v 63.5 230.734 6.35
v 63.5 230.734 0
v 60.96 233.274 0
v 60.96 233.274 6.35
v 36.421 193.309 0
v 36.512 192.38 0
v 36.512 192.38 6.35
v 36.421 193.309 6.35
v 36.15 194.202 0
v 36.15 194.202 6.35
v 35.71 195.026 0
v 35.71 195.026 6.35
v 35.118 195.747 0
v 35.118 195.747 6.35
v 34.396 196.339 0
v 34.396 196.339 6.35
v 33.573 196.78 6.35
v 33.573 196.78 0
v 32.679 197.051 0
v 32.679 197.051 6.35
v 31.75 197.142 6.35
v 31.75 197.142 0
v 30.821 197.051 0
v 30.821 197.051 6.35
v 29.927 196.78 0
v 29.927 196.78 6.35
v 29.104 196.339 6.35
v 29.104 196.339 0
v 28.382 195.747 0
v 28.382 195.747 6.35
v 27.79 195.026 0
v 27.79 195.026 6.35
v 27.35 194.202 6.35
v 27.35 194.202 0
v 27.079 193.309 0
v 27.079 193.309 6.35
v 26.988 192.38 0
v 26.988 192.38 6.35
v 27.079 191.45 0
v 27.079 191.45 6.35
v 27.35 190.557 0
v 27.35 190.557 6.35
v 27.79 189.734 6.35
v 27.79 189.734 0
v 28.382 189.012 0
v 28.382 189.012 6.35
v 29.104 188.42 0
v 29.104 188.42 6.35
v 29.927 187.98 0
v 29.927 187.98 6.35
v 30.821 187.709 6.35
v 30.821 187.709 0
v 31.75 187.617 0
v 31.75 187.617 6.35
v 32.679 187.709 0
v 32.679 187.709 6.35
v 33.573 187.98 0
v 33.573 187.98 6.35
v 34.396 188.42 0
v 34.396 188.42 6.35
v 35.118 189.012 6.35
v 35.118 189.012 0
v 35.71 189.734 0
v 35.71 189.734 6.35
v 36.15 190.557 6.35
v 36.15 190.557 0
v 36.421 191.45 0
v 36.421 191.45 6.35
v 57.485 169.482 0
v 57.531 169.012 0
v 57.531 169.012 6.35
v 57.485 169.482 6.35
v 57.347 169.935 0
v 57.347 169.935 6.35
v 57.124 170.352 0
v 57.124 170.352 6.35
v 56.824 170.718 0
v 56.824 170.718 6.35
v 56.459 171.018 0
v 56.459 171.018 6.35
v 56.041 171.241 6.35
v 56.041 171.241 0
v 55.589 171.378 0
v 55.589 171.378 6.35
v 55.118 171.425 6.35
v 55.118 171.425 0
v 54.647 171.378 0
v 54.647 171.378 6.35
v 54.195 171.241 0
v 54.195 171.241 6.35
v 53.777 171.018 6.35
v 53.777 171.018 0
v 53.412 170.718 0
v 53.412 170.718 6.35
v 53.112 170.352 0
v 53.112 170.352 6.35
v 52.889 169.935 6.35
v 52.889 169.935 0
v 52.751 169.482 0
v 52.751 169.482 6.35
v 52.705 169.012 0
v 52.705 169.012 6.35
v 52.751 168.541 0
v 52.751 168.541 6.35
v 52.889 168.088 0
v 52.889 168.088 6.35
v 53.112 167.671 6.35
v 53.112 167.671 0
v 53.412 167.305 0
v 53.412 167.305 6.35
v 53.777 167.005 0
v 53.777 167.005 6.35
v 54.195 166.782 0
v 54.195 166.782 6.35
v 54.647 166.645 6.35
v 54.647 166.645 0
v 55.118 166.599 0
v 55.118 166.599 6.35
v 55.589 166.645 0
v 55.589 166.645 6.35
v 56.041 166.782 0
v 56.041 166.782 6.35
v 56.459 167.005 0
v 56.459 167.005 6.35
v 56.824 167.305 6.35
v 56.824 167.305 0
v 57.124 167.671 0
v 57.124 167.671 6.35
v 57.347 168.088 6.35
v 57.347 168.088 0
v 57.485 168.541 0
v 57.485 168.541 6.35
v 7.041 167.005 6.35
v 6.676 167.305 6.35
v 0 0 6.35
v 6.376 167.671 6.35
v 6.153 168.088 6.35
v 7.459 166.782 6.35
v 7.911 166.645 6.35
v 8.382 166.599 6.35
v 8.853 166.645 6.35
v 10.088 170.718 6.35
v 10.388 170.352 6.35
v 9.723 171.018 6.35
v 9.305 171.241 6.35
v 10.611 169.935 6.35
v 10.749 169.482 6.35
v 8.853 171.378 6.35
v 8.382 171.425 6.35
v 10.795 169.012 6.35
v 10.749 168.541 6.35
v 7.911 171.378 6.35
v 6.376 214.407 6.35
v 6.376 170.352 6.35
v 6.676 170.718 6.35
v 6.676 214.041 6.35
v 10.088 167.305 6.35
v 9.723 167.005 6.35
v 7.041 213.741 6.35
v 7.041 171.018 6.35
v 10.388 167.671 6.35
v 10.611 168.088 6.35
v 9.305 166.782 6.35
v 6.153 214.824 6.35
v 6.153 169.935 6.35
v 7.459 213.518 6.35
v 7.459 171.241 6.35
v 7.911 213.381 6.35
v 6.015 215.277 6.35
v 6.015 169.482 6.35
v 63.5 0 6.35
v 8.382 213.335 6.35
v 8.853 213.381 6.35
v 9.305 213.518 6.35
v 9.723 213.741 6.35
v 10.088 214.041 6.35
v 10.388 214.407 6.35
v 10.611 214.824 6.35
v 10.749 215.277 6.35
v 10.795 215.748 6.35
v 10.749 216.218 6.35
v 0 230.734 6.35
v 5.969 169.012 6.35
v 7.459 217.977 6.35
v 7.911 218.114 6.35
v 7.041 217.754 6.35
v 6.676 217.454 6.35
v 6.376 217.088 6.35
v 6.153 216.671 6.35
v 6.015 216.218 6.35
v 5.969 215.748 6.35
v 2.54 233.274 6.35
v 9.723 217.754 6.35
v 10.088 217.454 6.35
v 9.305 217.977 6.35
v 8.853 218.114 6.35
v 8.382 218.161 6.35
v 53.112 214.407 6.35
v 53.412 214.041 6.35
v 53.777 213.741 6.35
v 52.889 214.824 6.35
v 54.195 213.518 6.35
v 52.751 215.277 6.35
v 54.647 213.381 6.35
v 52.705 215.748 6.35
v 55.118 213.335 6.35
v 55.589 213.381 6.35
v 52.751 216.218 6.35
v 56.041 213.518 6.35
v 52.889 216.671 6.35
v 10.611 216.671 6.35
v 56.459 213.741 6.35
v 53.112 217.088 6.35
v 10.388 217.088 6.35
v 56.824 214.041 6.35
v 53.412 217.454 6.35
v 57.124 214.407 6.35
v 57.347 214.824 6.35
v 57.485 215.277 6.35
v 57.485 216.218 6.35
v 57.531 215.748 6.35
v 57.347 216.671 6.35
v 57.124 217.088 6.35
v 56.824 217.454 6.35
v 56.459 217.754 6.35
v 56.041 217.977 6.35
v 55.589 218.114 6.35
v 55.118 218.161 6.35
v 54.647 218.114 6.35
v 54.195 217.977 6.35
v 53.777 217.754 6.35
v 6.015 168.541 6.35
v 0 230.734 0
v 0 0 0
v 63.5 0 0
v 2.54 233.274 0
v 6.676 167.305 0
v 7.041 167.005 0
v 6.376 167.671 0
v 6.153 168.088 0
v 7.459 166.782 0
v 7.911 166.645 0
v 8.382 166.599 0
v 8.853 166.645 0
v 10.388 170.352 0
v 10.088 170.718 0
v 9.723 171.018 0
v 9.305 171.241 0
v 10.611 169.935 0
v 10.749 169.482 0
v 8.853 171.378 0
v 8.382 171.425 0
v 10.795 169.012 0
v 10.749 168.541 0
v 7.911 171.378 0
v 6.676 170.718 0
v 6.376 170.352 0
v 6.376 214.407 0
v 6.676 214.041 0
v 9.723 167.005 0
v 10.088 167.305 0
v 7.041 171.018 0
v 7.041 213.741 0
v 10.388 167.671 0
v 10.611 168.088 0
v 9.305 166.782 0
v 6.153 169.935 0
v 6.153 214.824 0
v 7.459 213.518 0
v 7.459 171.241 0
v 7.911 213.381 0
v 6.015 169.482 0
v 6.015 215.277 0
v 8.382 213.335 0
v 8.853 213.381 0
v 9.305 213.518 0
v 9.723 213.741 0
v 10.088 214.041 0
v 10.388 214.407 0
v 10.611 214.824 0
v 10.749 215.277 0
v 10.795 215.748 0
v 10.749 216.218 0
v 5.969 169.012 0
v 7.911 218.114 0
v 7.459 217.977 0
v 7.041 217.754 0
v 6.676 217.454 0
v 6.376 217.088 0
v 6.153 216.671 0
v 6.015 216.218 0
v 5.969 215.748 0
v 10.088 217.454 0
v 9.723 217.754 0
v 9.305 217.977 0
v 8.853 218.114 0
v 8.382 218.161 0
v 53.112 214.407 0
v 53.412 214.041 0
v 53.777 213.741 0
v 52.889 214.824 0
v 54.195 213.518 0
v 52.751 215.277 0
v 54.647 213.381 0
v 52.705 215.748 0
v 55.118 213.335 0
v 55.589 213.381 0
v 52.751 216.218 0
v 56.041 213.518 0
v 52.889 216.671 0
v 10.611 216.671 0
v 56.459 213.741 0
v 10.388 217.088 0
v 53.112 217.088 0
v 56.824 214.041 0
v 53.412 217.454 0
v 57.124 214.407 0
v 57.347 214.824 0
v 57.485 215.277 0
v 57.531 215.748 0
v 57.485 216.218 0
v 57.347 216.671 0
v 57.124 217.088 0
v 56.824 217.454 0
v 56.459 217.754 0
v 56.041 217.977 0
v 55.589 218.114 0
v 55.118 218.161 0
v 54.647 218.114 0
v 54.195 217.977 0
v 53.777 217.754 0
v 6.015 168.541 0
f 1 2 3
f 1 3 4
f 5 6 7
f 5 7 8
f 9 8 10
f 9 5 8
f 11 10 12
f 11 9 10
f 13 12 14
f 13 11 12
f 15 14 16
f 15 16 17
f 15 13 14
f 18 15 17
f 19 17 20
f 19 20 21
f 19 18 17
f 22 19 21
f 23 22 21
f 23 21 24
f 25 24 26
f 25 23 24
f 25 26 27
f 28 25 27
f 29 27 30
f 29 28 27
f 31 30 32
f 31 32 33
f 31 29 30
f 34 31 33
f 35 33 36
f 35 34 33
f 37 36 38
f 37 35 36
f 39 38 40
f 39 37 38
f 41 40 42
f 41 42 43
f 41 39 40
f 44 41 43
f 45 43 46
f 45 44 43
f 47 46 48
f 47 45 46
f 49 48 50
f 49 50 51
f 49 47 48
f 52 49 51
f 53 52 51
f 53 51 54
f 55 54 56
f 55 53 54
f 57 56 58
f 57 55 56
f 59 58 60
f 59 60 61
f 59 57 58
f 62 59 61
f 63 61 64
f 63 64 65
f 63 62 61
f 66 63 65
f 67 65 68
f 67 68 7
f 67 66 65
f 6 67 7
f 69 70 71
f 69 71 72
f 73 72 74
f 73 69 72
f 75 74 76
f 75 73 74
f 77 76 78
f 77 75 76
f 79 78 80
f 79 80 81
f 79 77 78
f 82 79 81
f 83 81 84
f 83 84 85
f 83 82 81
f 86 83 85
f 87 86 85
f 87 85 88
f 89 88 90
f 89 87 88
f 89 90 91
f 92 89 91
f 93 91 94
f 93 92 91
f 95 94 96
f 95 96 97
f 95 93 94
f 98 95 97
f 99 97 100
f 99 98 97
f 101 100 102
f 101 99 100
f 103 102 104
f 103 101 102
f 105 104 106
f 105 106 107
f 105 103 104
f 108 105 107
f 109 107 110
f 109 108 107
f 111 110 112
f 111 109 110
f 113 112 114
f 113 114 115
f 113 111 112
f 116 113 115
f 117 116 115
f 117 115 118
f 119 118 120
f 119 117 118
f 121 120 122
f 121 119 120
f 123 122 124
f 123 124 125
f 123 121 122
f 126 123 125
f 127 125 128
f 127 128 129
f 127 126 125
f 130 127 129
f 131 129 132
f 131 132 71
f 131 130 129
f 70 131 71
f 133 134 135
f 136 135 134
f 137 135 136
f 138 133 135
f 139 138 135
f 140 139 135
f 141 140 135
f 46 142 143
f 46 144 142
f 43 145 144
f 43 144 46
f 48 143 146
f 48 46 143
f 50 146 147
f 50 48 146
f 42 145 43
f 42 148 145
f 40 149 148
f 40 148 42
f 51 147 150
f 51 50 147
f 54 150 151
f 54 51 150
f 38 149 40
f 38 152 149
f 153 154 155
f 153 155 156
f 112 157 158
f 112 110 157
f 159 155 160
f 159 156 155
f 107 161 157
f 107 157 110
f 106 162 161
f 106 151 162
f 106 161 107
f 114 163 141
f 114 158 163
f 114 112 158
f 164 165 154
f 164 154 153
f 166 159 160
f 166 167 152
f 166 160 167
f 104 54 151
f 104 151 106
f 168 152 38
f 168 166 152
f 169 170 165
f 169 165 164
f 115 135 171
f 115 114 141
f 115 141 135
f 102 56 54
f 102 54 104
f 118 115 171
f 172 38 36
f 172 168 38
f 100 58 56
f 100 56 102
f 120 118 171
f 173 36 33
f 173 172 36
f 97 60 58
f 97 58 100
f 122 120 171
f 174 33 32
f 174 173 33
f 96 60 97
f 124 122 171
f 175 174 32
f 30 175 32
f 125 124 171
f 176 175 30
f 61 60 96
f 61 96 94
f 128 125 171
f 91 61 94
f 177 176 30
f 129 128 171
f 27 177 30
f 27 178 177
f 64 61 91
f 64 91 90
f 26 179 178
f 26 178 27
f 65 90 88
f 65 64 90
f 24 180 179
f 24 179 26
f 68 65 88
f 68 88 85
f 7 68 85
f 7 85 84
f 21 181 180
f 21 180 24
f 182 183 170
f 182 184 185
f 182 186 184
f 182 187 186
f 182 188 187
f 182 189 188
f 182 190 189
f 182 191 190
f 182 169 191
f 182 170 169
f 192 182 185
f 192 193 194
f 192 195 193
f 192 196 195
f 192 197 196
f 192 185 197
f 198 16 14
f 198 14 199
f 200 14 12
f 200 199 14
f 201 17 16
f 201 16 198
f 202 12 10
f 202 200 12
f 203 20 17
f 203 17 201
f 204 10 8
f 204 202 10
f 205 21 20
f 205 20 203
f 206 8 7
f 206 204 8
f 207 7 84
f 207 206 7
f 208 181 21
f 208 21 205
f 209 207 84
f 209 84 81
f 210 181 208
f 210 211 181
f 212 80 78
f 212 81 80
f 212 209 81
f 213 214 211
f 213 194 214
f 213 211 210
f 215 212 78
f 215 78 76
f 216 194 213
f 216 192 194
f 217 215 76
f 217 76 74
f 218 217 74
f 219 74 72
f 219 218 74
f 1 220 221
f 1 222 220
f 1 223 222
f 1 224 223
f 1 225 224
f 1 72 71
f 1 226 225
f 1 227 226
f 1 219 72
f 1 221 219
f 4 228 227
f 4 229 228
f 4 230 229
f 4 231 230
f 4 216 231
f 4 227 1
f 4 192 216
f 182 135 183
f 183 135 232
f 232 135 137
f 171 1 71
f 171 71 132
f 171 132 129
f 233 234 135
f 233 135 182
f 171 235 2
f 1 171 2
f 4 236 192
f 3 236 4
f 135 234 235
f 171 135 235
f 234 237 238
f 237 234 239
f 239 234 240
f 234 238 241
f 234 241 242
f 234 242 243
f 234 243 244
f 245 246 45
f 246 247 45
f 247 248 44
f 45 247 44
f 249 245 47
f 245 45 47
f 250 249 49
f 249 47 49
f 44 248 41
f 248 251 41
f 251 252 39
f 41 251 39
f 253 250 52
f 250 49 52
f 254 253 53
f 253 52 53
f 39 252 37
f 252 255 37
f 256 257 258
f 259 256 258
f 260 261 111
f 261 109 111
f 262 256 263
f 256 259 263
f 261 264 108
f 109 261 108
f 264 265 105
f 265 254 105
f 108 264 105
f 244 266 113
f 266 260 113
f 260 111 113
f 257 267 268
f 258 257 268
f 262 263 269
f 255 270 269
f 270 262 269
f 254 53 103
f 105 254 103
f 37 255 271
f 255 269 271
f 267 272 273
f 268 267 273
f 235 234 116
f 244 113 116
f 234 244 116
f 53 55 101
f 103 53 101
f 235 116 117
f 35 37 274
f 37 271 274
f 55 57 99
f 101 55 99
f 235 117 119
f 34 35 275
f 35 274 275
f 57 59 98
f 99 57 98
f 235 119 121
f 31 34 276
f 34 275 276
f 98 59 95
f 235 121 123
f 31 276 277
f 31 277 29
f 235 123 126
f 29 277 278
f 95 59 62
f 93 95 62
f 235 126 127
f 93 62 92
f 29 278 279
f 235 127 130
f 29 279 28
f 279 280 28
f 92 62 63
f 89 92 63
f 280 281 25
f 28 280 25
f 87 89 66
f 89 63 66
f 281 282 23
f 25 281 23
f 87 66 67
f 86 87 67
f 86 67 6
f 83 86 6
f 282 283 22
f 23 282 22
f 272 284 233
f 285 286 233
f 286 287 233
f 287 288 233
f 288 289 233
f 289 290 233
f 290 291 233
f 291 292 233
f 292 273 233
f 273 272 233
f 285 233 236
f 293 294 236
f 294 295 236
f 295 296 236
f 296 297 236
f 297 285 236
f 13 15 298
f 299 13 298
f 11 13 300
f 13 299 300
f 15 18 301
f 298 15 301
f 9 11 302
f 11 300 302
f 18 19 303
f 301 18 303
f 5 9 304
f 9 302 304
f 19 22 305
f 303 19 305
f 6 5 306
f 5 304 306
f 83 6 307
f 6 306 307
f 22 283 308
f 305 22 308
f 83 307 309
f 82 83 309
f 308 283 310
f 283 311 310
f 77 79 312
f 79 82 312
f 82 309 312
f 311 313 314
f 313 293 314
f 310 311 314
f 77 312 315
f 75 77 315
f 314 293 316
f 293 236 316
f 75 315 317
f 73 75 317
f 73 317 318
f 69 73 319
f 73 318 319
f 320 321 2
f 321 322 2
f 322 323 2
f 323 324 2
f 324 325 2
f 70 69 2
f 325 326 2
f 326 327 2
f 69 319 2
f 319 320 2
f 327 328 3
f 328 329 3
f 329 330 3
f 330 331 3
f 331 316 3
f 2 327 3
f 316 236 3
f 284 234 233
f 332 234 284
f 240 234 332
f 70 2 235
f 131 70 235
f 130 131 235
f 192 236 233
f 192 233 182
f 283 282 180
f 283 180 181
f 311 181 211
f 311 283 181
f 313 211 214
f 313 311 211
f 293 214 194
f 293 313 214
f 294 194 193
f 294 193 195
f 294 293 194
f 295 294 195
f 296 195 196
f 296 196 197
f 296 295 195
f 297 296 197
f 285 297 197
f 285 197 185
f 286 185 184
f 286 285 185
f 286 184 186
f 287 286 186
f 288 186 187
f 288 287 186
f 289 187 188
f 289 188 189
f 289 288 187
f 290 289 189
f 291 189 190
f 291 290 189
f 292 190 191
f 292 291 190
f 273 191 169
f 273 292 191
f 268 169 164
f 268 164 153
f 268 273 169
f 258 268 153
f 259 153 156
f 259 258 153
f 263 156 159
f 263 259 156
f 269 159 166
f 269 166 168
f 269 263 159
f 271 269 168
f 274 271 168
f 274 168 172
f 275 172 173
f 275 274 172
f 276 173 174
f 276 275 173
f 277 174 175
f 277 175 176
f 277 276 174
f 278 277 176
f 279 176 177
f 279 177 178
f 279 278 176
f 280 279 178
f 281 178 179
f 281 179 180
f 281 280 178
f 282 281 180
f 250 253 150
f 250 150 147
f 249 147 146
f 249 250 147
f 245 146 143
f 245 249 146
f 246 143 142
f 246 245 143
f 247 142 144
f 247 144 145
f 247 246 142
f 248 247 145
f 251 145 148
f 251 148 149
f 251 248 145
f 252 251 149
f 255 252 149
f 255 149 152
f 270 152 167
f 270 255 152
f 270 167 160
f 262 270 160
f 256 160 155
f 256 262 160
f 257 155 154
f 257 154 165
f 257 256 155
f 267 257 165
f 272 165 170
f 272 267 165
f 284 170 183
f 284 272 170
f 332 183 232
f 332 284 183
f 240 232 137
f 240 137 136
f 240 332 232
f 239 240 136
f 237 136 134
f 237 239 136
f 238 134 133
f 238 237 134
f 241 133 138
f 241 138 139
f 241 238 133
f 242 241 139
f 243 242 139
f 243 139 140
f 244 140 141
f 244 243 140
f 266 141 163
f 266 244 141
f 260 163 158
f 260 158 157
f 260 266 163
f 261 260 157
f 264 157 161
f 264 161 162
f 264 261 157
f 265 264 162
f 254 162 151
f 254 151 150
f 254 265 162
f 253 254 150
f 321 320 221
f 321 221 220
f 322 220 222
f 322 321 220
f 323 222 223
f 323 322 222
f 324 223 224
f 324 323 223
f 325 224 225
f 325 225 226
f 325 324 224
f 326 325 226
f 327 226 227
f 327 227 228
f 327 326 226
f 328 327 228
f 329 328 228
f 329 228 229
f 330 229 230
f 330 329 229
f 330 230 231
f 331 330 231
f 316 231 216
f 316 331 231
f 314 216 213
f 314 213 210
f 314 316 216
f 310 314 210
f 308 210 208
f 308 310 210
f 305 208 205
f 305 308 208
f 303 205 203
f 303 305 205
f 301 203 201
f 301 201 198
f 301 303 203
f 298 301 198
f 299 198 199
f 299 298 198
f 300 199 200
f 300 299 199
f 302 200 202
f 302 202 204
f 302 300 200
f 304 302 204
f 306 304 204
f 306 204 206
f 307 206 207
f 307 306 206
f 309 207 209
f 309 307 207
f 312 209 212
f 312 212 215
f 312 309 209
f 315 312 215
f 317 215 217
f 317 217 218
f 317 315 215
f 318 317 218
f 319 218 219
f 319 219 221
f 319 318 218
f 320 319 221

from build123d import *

# Parameters (mm, degrees)
SKETCH1_W           = 63.5
SKETCH1_H           = 233.2736
SKETCH1_R           = 2.413
SKETCH1_R_2         = 4.7625
BOSS_EXTRUDE1_DEPTH = 6.35
CHAMFER1_SIZE       = 2.54


with BuildPart() as part:
    # Sketch1 → Boss-Extrude1 (new body)
    with BuildSketch(Plane.XY):
        with Locations((31.75, 116.6368)):
            Rectangle(SKETCH1_W, SKETCH1_H)
        with Locations((8.382, 215.7476)):
            Circle(SKETCH1_R, mode=Mode.SUBTRACT)
        with Locations((55.118, 215.7476)):
            Circle(SKETCH1_R, mode=Mode.SUBTRACT)
        with Locations((8.382, 169.0116)):
            Circle(SKETCH1_R, mode=Mode.SUBTRACT)
        with Locations((55.118, 169.0116)):
            Circle(SKETCH1_R, mode=Mode.SUBTRACT)
        with Locations((31.75, 192.3796)):
            Circle(SKETCH1_R_2, mode=Mode.SUBTRACT)
    extrude(amount=BOSS_EXTRUDE1_DEPTH)

    # Chamfer1
    chamfer1_edges = [part.edges().sort_by_distance(p)[0] for p in [
        (0, 233.2736, 3.175),
        (63.5, 233.2736, 3.175),
    ]]
    chamfer(chamfer1_edges, length=CHAMFER1_SIZE)


solid = part.part
